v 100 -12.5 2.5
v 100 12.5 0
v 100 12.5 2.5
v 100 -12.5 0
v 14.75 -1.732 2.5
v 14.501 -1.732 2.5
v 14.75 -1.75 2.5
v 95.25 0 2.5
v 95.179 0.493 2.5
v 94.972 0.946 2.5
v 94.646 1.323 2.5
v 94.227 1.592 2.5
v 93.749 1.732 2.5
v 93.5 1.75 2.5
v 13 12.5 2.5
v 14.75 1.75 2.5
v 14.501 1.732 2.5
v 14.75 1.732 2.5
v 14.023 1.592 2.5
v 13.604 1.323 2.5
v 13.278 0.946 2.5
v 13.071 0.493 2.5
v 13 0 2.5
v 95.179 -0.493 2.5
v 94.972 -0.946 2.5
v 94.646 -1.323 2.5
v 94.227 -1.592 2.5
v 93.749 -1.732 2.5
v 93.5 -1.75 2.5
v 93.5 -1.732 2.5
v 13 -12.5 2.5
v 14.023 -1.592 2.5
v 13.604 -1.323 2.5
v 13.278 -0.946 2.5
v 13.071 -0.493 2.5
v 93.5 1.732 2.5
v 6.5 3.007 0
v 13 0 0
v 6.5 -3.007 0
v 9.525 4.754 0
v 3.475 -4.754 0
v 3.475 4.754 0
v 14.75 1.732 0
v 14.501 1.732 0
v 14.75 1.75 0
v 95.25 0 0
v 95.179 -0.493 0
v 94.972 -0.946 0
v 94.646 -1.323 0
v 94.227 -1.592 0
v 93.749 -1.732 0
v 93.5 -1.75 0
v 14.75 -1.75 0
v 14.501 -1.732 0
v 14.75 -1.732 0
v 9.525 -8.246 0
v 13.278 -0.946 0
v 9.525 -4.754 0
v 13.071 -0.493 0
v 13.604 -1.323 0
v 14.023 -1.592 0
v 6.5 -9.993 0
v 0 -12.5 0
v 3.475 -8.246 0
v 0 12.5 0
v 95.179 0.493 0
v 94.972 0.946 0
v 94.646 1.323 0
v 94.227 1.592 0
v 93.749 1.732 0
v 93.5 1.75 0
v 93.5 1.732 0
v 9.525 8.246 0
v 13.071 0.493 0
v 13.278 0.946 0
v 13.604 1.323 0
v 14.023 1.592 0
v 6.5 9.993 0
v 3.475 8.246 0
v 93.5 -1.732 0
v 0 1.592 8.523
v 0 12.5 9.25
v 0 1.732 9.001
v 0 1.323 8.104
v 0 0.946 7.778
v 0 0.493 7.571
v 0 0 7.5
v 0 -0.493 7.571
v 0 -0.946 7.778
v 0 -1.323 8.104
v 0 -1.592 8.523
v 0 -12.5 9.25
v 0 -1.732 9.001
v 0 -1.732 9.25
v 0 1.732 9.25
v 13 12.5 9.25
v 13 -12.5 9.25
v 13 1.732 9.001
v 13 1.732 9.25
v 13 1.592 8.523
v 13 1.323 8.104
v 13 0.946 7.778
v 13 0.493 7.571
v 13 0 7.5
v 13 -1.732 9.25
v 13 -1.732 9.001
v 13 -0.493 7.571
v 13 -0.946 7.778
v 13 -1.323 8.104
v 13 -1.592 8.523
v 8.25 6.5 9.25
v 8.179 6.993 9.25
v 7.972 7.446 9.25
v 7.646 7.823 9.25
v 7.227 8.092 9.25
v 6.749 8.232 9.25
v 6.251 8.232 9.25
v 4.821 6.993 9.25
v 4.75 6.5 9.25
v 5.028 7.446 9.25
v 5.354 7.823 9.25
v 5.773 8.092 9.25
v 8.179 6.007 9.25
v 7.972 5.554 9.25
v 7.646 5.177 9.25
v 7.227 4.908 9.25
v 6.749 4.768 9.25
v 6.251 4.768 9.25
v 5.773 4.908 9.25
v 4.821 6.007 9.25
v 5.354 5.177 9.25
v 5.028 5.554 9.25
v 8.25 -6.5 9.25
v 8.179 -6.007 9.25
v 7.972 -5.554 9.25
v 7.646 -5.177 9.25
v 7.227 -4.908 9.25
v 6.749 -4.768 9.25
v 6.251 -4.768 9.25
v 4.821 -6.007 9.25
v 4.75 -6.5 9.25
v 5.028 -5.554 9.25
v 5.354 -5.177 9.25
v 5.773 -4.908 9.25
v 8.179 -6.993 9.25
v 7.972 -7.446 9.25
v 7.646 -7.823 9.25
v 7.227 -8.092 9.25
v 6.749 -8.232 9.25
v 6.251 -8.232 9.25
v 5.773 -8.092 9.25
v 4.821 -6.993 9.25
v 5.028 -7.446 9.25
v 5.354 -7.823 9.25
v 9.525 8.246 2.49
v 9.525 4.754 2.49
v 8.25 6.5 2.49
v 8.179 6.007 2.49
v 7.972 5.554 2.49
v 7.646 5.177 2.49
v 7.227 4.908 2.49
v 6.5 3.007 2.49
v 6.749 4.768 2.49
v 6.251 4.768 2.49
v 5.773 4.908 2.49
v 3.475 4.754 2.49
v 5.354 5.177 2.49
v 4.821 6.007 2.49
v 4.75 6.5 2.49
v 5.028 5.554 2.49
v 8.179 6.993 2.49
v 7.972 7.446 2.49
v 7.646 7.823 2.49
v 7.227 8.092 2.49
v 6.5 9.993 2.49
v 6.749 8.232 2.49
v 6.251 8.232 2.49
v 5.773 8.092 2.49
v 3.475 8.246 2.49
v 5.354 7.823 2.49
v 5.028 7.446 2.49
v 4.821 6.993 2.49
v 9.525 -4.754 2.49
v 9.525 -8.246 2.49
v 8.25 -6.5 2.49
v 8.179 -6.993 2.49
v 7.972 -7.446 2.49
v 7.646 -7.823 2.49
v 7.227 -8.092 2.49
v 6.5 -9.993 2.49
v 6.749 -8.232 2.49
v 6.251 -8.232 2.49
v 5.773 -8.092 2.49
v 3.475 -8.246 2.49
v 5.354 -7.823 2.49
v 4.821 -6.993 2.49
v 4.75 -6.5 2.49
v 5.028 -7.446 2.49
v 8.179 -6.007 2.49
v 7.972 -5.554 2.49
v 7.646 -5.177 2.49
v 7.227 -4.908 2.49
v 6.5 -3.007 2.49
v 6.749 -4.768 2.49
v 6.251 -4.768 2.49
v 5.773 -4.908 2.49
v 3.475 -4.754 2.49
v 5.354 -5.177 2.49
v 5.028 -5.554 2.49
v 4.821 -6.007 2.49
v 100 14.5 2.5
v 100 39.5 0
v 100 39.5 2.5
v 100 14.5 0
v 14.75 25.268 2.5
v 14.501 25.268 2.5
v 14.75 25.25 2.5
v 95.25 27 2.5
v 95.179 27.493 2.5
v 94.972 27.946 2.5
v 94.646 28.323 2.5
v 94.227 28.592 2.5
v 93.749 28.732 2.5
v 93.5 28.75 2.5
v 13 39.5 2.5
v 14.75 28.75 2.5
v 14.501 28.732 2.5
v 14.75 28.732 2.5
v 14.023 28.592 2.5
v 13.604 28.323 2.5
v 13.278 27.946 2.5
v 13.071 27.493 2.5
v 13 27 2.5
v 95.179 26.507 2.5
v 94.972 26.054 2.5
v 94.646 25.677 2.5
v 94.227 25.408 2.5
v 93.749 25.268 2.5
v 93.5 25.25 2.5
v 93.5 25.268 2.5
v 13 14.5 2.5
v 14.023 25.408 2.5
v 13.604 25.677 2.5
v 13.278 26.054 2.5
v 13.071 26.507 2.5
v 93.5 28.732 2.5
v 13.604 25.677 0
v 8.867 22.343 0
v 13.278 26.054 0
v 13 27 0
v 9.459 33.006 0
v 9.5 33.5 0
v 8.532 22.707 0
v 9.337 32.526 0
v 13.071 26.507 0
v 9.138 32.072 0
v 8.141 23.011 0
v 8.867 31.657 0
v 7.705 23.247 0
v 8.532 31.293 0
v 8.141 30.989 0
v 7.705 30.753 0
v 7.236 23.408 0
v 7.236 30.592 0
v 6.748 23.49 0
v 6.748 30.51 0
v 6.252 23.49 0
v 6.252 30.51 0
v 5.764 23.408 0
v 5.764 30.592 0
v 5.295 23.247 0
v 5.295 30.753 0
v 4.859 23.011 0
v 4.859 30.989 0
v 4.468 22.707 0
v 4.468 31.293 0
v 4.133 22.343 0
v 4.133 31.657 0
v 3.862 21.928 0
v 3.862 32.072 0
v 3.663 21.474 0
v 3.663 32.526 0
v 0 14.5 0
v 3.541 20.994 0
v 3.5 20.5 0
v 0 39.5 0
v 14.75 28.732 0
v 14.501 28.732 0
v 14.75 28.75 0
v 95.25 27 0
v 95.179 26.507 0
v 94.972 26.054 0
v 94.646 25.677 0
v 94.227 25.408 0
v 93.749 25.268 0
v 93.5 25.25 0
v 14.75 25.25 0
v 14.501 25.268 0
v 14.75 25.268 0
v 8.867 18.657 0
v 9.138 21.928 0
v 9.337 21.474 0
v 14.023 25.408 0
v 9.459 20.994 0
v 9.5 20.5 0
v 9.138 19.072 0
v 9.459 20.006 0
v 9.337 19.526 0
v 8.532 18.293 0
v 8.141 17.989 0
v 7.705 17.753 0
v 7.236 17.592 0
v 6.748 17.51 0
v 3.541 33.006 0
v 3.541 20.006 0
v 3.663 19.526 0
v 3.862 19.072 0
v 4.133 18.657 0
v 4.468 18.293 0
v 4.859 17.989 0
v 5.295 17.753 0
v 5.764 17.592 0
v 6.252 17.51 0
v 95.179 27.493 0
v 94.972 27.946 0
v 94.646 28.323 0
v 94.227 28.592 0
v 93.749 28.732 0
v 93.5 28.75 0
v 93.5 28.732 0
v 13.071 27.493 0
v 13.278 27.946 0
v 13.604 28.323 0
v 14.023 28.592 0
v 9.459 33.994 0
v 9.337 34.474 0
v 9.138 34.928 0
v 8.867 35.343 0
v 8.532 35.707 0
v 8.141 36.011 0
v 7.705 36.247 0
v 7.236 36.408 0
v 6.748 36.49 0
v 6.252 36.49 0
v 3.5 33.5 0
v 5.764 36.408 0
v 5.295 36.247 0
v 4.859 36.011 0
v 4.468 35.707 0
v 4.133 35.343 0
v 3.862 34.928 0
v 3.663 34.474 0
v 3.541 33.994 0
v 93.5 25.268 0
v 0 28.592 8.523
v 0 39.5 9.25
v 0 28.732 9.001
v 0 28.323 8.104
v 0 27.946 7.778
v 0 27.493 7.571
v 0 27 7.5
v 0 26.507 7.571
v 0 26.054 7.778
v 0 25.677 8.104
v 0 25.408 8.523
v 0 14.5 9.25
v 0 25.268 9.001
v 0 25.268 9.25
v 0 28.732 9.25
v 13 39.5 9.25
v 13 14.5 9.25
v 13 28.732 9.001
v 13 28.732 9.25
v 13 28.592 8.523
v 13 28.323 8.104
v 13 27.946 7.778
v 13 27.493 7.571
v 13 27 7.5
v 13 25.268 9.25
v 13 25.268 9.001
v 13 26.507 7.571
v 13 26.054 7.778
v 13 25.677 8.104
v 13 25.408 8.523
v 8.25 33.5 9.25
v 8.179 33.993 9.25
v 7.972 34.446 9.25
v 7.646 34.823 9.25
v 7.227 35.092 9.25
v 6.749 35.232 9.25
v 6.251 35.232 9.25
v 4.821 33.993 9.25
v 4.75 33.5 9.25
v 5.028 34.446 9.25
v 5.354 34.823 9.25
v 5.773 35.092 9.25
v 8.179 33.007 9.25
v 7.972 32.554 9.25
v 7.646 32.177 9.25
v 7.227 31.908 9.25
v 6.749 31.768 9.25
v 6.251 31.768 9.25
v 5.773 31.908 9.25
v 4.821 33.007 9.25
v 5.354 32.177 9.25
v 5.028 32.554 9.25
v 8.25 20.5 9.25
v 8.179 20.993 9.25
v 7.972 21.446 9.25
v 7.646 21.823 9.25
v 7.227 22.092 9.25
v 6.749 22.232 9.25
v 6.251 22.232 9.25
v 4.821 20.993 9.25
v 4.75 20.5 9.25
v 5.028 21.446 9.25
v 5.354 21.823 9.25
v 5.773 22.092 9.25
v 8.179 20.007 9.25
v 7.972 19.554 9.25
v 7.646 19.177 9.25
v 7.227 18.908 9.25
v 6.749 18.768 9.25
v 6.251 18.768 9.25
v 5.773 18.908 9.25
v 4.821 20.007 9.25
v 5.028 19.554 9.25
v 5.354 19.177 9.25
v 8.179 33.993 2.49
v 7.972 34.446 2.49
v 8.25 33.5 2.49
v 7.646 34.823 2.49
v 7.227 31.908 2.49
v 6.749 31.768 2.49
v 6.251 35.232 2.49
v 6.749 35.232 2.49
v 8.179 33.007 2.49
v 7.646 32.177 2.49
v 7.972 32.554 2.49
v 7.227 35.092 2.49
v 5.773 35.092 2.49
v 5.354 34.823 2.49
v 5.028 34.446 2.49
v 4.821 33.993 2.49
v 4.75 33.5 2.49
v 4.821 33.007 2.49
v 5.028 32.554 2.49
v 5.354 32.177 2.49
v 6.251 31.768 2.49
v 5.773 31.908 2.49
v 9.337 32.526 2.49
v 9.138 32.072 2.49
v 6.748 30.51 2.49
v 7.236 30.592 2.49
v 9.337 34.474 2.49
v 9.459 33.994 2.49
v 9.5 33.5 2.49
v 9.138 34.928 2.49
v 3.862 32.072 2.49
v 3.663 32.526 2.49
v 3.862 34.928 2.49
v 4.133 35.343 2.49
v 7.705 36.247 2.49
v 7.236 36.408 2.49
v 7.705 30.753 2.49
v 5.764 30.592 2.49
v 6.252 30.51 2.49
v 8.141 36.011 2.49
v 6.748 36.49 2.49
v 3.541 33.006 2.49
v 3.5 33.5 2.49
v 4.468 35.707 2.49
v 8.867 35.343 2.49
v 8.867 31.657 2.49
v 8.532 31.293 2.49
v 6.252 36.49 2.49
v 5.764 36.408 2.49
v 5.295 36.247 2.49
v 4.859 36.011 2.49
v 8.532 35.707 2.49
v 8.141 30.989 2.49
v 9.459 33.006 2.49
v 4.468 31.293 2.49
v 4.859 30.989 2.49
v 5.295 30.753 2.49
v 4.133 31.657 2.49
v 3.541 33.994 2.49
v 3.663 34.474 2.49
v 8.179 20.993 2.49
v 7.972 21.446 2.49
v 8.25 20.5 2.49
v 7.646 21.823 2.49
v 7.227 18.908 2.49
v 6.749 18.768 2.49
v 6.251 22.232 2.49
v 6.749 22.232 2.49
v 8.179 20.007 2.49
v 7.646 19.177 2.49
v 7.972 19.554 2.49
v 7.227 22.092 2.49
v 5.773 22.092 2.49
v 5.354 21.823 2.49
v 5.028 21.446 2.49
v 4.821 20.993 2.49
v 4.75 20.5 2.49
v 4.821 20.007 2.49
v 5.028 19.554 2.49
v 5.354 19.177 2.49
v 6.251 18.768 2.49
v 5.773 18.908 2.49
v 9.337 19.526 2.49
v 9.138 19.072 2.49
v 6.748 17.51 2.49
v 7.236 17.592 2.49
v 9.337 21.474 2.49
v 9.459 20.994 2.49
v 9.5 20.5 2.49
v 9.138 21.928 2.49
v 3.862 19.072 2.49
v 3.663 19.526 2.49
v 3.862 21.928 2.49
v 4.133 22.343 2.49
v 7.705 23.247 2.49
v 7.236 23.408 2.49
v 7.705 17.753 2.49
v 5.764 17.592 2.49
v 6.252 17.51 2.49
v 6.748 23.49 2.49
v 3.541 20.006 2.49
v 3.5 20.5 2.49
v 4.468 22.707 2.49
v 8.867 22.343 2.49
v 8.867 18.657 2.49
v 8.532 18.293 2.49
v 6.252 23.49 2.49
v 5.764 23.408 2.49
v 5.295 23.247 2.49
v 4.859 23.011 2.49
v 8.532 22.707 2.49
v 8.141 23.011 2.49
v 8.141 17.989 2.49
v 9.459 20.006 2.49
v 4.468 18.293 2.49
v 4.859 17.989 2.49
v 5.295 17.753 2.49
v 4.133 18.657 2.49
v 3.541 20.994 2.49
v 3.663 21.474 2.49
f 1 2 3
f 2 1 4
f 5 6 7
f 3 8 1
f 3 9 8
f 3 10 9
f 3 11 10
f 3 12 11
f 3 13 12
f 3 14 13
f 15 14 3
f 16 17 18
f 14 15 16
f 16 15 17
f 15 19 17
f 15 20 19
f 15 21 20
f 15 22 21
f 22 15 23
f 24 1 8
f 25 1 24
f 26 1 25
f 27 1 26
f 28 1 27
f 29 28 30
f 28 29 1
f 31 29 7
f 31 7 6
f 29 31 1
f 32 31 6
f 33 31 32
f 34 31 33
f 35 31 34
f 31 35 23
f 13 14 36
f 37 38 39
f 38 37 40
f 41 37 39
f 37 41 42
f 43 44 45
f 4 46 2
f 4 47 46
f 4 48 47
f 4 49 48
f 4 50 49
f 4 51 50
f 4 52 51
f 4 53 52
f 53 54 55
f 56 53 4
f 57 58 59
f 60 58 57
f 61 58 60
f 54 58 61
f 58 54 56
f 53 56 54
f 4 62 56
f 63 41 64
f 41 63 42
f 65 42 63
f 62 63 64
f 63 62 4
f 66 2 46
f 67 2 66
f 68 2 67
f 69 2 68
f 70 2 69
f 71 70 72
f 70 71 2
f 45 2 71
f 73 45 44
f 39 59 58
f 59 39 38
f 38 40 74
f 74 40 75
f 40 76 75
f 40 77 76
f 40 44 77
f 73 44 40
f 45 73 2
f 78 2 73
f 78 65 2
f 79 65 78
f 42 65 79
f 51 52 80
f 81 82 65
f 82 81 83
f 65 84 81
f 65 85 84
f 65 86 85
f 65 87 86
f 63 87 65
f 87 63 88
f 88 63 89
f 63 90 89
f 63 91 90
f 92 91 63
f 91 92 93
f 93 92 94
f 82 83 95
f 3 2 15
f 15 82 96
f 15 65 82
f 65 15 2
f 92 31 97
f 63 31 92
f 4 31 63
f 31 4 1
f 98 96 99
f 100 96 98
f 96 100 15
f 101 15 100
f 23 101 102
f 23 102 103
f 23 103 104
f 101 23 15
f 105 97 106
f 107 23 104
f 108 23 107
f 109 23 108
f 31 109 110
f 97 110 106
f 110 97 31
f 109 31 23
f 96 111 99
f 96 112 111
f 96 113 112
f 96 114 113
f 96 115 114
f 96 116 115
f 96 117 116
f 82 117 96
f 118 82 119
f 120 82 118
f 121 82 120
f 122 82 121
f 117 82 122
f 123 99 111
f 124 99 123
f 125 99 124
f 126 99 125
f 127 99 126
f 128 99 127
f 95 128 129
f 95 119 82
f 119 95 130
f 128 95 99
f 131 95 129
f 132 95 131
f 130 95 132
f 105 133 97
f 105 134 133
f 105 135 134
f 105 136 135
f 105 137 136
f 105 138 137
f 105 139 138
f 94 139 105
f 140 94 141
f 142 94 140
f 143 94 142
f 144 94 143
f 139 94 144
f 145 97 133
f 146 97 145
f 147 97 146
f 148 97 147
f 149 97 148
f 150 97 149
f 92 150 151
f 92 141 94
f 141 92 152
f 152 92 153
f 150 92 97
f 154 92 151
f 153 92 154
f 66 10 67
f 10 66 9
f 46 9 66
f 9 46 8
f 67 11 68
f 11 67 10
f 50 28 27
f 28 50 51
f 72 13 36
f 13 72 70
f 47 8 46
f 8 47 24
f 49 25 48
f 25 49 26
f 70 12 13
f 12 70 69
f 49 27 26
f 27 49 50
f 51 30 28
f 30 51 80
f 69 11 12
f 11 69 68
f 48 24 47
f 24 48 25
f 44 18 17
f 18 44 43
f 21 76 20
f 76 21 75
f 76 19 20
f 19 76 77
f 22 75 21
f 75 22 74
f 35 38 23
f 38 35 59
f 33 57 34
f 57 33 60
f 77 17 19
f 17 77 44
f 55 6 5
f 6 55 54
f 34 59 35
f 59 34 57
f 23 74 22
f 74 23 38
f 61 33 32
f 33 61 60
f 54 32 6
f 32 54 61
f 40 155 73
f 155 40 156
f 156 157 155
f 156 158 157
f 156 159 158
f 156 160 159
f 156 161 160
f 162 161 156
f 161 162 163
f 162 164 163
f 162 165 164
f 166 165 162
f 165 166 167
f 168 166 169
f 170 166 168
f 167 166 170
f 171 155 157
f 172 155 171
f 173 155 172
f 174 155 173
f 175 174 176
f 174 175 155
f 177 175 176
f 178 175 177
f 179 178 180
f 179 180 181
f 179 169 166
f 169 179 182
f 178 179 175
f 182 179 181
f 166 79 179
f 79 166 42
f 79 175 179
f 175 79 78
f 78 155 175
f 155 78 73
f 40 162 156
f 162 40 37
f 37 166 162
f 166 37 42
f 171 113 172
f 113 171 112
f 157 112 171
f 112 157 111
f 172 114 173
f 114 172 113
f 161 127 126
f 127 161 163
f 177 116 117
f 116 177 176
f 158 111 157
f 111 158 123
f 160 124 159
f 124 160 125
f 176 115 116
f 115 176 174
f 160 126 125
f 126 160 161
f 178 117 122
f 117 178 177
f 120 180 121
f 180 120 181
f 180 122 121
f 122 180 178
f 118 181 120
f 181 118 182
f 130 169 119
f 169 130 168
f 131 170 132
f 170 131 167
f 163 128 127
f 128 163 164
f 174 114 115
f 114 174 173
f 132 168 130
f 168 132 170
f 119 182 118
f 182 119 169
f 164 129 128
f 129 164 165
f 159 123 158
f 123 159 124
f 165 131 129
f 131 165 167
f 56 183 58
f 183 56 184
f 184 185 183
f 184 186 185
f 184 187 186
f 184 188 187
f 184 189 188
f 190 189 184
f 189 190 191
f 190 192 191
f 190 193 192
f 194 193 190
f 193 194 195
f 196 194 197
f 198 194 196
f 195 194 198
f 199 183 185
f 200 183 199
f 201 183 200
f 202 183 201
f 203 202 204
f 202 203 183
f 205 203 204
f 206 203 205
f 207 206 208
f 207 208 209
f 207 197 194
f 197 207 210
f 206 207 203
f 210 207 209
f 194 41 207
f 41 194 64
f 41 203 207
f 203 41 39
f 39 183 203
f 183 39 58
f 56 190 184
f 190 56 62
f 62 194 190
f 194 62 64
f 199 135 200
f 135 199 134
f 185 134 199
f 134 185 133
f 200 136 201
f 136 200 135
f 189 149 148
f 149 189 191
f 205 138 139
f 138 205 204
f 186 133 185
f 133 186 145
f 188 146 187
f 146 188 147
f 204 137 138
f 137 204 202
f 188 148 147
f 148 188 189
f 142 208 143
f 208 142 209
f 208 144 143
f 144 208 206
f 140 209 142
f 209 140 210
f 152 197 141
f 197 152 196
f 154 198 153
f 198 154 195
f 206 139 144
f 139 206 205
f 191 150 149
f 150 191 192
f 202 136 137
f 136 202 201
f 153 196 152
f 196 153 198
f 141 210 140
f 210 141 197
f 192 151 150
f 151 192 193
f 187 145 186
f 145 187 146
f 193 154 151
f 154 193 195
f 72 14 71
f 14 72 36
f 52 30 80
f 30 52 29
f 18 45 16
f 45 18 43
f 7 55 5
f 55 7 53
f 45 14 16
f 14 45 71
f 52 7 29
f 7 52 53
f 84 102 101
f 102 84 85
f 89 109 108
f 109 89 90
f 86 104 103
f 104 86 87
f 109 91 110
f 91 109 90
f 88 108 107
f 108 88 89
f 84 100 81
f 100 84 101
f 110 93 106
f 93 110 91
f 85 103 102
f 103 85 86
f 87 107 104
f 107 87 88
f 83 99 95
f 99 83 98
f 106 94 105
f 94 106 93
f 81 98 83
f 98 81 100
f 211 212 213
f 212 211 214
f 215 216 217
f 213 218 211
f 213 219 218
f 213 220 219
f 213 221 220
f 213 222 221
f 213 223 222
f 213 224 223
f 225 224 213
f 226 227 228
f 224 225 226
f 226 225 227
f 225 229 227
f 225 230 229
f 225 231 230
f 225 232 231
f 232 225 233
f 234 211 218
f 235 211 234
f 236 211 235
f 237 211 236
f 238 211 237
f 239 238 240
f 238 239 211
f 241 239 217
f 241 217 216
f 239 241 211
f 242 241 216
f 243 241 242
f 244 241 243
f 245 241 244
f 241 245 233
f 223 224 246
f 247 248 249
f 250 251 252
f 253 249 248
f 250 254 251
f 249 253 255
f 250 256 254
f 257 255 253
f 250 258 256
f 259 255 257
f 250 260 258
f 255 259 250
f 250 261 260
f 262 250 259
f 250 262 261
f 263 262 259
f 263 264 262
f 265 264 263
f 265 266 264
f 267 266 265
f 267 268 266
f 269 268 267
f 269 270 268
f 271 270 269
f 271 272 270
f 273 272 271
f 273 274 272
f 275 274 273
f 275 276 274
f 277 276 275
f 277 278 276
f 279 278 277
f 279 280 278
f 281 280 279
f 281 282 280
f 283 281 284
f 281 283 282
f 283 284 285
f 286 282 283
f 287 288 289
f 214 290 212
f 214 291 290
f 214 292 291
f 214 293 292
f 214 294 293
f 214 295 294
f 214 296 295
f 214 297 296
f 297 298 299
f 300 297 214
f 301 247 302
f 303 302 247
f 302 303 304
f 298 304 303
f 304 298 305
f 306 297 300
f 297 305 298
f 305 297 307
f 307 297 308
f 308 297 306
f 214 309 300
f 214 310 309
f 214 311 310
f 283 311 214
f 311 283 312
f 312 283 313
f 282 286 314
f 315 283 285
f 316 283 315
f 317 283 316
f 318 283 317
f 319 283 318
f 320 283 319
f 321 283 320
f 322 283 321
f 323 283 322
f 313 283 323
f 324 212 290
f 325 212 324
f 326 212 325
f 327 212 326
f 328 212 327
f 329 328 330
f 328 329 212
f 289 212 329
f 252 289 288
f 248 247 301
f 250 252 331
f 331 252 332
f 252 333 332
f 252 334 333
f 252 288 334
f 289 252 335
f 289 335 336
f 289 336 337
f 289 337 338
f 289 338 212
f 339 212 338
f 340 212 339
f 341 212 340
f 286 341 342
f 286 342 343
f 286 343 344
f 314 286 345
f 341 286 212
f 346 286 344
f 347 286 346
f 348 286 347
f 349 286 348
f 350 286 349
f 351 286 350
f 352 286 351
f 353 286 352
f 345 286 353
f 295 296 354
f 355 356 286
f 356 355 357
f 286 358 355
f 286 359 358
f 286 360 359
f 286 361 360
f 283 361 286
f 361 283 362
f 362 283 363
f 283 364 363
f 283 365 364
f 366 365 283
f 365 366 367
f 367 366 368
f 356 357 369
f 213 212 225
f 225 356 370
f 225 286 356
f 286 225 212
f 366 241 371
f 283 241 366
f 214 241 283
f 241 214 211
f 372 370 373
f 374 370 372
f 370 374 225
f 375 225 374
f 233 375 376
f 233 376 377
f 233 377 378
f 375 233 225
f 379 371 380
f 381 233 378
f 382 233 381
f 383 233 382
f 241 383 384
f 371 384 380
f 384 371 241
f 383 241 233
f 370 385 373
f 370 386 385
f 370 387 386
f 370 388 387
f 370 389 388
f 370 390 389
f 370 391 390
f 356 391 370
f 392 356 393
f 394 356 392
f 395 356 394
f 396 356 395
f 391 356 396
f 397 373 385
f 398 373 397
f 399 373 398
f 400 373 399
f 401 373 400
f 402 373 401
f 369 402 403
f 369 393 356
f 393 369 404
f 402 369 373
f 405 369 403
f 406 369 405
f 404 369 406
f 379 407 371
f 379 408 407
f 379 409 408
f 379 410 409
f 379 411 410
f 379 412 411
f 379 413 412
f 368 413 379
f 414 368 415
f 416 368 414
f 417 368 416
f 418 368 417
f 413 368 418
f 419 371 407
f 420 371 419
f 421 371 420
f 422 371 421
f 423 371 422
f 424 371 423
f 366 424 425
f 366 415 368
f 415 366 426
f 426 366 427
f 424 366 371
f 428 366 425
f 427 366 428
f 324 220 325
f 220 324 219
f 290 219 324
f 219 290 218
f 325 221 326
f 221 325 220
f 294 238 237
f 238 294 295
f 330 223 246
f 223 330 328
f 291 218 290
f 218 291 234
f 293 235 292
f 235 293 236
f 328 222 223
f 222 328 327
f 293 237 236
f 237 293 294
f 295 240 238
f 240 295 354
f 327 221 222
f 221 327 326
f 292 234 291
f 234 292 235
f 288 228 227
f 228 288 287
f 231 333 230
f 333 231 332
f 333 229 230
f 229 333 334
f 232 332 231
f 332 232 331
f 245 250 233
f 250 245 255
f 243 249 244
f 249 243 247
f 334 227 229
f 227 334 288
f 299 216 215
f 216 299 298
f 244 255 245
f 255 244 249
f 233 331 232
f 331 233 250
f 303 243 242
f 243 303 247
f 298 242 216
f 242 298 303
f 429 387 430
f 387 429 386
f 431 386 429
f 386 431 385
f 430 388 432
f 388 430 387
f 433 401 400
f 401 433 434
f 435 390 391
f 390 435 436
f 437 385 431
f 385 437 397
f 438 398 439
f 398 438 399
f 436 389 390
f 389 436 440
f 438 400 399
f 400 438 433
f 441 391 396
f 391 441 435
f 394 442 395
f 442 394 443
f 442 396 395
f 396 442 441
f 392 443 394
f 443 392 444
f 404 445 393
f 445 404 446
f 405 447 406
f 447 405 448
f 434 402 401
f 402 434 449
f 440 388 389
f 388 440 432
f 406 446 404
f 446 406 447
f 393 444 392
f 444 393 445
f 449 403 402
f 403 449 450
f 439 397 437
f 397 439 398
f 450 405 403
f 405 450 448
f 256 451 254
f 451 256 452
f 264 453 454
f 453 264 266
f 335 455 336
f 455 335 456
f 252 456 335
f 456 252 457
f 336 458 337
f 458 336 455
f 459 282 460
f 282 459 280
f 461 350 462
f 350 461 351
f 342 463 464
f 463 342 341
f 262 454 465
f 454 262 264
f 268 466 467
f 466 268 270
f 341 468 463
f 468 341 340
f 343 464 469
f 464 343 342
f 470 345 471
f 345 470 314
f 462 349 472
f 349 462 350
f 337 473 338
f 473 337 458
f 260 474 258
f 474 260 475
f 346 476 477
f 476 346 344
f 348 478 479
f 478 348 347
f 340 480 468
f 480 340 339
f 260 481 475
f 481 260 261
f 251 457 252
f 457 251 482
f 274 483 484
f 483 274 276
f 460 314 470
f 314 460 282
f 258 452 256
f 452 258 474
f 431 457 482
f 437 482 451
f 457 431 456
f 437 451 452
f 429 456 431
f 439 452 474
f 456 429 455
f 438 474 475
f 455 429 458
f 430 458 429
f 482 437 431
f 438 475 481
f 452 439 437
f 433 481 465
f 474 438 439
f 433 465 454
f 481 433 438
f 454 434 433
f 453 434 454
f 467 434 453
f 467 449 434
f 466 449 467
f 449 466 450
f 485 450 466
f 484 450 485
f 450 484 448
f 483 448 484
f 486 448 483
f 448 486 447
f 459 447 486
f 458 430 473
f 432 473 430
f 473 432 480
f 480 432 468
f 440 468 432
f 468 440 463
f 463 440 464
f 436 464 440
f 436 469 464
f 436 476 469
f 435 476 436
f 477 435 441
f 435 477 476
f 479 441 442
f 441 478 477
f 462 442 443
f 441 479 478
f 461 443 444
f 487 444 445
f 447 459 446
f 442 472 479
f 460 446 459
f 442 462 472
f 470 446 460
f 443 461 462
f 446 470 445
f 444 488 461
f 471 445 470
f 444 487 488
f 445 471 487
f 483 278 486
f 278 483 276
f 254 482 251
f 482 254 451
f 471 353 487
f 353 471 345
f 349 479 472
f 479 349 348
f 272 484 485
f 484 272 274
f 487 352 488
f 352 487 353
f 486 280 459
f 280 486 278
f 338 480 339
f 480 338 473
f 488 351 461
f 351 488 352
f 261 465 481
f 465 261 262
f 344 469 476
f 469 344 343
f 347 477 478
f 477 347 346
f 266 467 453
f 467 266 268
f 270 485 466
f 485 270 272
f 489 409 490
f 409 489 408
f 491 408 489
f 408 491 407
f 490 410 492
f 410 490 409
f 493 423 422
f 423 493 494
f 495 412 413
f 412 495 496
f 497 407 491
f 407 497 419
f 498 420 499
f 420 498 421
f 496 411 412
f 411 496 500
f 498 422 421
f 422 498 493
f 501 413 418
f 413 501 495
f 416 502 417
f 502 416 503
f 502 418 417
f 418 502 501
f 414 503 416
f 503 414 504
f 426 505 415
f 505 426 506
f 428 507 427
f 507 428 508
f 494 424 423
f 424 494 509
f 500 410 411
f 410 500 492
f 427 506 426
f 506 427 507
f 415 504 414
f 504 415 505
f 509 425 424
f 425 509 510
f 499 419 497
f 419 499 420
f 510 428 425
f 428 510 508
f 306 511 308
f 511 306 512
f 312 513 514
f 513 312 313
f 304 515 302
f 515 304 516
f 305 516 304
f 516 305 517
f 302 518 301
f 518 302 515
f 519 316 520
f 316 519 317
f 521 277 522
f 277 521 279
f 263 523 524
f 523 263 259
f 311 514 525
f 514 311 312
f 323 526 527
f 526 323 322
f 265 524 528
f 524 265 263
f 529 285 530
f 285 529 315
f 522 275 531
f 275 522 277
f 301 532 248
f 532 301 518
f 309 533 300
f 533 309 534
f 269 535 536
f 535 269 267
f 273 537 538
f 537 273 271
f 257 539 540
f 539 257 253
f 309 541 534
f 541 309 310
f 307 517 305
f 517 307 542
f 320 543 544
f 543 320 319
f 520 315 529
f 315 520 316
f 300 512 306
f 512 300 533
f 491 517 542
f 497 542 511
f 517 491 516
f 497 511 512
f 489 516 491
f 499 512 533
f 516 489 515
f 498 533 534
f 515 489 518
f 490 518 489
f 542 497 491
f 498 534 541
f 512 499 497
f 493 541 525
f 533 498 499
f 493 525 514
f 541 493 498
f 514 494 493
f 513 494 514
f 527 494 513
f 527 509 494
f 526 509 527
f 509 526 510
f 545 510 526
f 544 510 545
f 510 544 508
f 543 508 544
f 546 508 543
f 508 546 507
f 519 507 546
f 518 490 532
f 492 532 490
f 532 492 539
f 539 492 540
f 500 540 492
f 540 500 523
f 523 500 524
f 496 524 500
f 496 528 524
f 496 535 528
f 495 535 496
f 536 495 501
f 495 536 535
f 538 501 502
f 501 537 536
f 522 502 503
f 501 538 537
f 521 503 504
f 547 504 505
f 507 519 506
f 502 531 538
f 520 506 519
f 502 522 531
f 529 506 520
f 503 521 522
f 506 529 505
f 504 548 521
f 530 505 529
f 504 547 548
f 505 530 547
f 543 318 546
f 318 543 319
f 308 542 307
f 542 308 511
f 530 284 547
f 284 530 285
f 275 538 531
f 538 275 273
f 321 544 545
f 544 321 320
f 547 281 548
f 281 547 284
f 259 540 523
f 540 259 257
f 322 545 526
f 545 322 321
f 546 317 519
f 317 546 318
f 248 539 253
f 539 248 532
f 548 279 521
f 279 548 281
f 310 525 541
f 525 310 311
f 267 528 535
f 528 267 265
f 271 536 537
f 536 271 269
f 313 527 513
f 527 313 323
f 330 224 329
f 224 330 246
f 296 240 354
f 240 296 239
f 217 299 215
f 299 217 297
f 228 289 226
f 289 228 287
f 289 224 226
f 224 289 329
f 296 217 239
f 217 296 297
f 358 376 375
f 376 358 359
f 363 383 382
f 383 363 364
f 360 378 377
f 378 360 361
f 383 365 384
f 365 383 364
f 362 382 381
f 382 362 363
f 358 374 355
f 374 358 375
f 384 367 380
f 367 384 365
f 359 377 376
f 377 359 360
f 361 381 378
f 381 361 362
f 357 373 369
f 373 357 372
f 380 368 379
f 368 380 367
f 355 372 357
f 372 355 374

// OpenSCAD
// file: nuts.scad
e = 0.1; // epsilon

// Screws / Nuts
// described by a K-Element vector, offsets defined as follows
nut_diameter_low   = 0;
nut_diameter_high  = 1;
nut_height         = 2;
screw_channel      = 3;
screw_head_channel = 4;
screw_head_height  = 5;
m3 = [ 5.6,  6.5, 2.5, 3.5,  6.0, 2.5];
m4 = [ 7.0,  8.0, 3.5, 4.5,  7.5, 3.0];
m5 = [ 8.0,  9.2, 3.7, 5.0,  9.2, 3.5];
m6 = [10.0, 11.2, 5.0, 6.0, 10.1, 4.0];

module nut_hole (nut, h)
{
    w = (nut [nut_diameter_low] + nut [nut_diameter_high]) / 2;
    translate ([0, 0, h / 2]) difference () {
        cube ([w, 2*w, h], center = true);
        rotate ([0, 0, 30])
            translate ([0, 1.5 * w, 0])
                cube ([2*w, 2*w, h+e], center = true);
        rotate ([0, 0, -30])
            translate ([0, 1.5 * w, 0])
                cube ([2*w, 2*w, h+e], center = true);
        rotate ([0, 0, 30])
            translate ([0, -1.5 * w, 0])
                cube ([2*w, 2*w, h+e], center = true);
        rotate ([0, 0, -30])
            translate ([0, -1.5 * w, 0])
                cube ([2*w, 2*w, h+e], center = true);
    }
}

// A screw channel + cone for a sunk screw, with h2 it can be deeper
// h is the length of the screw, h2 is how far it is sunk in the cone
// height/width only depends on the given nut.
module countersunk_screw_hole (nut, h, h2 = 0)
{
    cylinder
        ( r1 = (nut [screw_head_channel] * 1.1) / 2
        , r2 = (nut [screw_channel]      * 1.1) / 2
        , h  = nut [screw_head_height]  * 1.05
        );
    cylinder (r = nut [screw_channel] / 2, h = h + nut [screw_head_height]);
    translate ([0, 0, -h2])
        cylinder (r = nut [screw_head_channel] * 1.1 / 2, h = h2);
}
//translate ([5, 0, 0])
//    countersunk_screw_hole (m5, 10, 10, $fa = 6, $fs = .5);

// A channel for a sideways embedded nut
// ehf is the factor for the embedded height for the hole of the nut, we
// make it a little wider than nut-height by default, but it can be
// overridden.
// ewf is the factor for the width of the hole (nut diameter * ewf)
module embedded_nut (nut, h, ehf=1.3, ewf=1)
{
    w = (nut [nut_diameter_low] + nut [nut_diameter_high]) / 2;
    union () {
        translate ([0, -w * ewf * 0.5, 0])
            cube ([nut [nut_height] * ehf, w * ewf, h]);
        rotate ([0, 90, 0]) rotate ([0, 0, 30])
            nut_hole (nut, nut [nut_height] * ehf);
    }
}
//embedded_nut (m3, 20);
// main file
// Mount for Faraday coupling loop for magnetic antenna

include <nuts.scad>

e=0.01;  // epsilon
l=100;   // length of plate
w=25;    // width of plate
t=2.5;   // thickness of plate
t2=13.5; // thickness of high part (half of it, each part gets half)

module couplingmount
    (l=l, w=w, t=t, t2=t2, nut1=m3, nut2=m3, nut3=m3, make_nut=true)
{
    nd1 = nut1 [nut_diameter_high];
    nd2 = nut2 [nut_diameter_high];
    sc1 = nut1 [screw_channel];
    sc2 = nut2 [screw_channel];
    difference () {
        union () {
            translate ([l/2, 0, t/2])
                cube ([l, w, t], center=true);
            translate ([nd1, 0, (t + t2/2)/2])
                cube ([2*nd1, w, t + t2/2], center=true);
        }
        translate ([-(l-2*nd1-nd2-sc2/2)/2 + l-nd2, 0, 0])
            cube ([l-2*nd1-nd2-sc2/2, sc2, 3*t], center=true);
        for (x = [l-nd2, 2*nd1+sc2/2]) {
            translate ([x, 0, -2*t])
                cylinder (r=sc2/2, h=5*t);
        }
        for (y = [nut1 [nut_diameter_high], -nut1 [nut_diameter_high]]) {
            translate ([0, y, 0]) {
                translate ([nd1, 0, -t])
                    cylinder (r=sc1/2, h=9*t);
                translate ([nd1, 0, -e]) {
                    if (make_nut) {
                        nut_hole (nut1, nut1 [nut_height]);
                    } else {
                        cylinder
                            ( r = nut1 [screw_head_channel]/2
                            , h = nut1 [screw_head_height]
                            );
                    }
                }
            }
        }
        translate ([-nd1, 0, t+t2/2]) {
            rotate ([0, 90, 0]) {
                cylinder (r = nut3 [screw_channel] / 2, h = 6*nd1);
            }
        }
    }
}

for (tr = [0, w+2]) {
    donut = tr == 0;
    translate ([0, tr, 0])
        couplingmount ($fa=3, $fs=0.5, make_nut=donut);
}
